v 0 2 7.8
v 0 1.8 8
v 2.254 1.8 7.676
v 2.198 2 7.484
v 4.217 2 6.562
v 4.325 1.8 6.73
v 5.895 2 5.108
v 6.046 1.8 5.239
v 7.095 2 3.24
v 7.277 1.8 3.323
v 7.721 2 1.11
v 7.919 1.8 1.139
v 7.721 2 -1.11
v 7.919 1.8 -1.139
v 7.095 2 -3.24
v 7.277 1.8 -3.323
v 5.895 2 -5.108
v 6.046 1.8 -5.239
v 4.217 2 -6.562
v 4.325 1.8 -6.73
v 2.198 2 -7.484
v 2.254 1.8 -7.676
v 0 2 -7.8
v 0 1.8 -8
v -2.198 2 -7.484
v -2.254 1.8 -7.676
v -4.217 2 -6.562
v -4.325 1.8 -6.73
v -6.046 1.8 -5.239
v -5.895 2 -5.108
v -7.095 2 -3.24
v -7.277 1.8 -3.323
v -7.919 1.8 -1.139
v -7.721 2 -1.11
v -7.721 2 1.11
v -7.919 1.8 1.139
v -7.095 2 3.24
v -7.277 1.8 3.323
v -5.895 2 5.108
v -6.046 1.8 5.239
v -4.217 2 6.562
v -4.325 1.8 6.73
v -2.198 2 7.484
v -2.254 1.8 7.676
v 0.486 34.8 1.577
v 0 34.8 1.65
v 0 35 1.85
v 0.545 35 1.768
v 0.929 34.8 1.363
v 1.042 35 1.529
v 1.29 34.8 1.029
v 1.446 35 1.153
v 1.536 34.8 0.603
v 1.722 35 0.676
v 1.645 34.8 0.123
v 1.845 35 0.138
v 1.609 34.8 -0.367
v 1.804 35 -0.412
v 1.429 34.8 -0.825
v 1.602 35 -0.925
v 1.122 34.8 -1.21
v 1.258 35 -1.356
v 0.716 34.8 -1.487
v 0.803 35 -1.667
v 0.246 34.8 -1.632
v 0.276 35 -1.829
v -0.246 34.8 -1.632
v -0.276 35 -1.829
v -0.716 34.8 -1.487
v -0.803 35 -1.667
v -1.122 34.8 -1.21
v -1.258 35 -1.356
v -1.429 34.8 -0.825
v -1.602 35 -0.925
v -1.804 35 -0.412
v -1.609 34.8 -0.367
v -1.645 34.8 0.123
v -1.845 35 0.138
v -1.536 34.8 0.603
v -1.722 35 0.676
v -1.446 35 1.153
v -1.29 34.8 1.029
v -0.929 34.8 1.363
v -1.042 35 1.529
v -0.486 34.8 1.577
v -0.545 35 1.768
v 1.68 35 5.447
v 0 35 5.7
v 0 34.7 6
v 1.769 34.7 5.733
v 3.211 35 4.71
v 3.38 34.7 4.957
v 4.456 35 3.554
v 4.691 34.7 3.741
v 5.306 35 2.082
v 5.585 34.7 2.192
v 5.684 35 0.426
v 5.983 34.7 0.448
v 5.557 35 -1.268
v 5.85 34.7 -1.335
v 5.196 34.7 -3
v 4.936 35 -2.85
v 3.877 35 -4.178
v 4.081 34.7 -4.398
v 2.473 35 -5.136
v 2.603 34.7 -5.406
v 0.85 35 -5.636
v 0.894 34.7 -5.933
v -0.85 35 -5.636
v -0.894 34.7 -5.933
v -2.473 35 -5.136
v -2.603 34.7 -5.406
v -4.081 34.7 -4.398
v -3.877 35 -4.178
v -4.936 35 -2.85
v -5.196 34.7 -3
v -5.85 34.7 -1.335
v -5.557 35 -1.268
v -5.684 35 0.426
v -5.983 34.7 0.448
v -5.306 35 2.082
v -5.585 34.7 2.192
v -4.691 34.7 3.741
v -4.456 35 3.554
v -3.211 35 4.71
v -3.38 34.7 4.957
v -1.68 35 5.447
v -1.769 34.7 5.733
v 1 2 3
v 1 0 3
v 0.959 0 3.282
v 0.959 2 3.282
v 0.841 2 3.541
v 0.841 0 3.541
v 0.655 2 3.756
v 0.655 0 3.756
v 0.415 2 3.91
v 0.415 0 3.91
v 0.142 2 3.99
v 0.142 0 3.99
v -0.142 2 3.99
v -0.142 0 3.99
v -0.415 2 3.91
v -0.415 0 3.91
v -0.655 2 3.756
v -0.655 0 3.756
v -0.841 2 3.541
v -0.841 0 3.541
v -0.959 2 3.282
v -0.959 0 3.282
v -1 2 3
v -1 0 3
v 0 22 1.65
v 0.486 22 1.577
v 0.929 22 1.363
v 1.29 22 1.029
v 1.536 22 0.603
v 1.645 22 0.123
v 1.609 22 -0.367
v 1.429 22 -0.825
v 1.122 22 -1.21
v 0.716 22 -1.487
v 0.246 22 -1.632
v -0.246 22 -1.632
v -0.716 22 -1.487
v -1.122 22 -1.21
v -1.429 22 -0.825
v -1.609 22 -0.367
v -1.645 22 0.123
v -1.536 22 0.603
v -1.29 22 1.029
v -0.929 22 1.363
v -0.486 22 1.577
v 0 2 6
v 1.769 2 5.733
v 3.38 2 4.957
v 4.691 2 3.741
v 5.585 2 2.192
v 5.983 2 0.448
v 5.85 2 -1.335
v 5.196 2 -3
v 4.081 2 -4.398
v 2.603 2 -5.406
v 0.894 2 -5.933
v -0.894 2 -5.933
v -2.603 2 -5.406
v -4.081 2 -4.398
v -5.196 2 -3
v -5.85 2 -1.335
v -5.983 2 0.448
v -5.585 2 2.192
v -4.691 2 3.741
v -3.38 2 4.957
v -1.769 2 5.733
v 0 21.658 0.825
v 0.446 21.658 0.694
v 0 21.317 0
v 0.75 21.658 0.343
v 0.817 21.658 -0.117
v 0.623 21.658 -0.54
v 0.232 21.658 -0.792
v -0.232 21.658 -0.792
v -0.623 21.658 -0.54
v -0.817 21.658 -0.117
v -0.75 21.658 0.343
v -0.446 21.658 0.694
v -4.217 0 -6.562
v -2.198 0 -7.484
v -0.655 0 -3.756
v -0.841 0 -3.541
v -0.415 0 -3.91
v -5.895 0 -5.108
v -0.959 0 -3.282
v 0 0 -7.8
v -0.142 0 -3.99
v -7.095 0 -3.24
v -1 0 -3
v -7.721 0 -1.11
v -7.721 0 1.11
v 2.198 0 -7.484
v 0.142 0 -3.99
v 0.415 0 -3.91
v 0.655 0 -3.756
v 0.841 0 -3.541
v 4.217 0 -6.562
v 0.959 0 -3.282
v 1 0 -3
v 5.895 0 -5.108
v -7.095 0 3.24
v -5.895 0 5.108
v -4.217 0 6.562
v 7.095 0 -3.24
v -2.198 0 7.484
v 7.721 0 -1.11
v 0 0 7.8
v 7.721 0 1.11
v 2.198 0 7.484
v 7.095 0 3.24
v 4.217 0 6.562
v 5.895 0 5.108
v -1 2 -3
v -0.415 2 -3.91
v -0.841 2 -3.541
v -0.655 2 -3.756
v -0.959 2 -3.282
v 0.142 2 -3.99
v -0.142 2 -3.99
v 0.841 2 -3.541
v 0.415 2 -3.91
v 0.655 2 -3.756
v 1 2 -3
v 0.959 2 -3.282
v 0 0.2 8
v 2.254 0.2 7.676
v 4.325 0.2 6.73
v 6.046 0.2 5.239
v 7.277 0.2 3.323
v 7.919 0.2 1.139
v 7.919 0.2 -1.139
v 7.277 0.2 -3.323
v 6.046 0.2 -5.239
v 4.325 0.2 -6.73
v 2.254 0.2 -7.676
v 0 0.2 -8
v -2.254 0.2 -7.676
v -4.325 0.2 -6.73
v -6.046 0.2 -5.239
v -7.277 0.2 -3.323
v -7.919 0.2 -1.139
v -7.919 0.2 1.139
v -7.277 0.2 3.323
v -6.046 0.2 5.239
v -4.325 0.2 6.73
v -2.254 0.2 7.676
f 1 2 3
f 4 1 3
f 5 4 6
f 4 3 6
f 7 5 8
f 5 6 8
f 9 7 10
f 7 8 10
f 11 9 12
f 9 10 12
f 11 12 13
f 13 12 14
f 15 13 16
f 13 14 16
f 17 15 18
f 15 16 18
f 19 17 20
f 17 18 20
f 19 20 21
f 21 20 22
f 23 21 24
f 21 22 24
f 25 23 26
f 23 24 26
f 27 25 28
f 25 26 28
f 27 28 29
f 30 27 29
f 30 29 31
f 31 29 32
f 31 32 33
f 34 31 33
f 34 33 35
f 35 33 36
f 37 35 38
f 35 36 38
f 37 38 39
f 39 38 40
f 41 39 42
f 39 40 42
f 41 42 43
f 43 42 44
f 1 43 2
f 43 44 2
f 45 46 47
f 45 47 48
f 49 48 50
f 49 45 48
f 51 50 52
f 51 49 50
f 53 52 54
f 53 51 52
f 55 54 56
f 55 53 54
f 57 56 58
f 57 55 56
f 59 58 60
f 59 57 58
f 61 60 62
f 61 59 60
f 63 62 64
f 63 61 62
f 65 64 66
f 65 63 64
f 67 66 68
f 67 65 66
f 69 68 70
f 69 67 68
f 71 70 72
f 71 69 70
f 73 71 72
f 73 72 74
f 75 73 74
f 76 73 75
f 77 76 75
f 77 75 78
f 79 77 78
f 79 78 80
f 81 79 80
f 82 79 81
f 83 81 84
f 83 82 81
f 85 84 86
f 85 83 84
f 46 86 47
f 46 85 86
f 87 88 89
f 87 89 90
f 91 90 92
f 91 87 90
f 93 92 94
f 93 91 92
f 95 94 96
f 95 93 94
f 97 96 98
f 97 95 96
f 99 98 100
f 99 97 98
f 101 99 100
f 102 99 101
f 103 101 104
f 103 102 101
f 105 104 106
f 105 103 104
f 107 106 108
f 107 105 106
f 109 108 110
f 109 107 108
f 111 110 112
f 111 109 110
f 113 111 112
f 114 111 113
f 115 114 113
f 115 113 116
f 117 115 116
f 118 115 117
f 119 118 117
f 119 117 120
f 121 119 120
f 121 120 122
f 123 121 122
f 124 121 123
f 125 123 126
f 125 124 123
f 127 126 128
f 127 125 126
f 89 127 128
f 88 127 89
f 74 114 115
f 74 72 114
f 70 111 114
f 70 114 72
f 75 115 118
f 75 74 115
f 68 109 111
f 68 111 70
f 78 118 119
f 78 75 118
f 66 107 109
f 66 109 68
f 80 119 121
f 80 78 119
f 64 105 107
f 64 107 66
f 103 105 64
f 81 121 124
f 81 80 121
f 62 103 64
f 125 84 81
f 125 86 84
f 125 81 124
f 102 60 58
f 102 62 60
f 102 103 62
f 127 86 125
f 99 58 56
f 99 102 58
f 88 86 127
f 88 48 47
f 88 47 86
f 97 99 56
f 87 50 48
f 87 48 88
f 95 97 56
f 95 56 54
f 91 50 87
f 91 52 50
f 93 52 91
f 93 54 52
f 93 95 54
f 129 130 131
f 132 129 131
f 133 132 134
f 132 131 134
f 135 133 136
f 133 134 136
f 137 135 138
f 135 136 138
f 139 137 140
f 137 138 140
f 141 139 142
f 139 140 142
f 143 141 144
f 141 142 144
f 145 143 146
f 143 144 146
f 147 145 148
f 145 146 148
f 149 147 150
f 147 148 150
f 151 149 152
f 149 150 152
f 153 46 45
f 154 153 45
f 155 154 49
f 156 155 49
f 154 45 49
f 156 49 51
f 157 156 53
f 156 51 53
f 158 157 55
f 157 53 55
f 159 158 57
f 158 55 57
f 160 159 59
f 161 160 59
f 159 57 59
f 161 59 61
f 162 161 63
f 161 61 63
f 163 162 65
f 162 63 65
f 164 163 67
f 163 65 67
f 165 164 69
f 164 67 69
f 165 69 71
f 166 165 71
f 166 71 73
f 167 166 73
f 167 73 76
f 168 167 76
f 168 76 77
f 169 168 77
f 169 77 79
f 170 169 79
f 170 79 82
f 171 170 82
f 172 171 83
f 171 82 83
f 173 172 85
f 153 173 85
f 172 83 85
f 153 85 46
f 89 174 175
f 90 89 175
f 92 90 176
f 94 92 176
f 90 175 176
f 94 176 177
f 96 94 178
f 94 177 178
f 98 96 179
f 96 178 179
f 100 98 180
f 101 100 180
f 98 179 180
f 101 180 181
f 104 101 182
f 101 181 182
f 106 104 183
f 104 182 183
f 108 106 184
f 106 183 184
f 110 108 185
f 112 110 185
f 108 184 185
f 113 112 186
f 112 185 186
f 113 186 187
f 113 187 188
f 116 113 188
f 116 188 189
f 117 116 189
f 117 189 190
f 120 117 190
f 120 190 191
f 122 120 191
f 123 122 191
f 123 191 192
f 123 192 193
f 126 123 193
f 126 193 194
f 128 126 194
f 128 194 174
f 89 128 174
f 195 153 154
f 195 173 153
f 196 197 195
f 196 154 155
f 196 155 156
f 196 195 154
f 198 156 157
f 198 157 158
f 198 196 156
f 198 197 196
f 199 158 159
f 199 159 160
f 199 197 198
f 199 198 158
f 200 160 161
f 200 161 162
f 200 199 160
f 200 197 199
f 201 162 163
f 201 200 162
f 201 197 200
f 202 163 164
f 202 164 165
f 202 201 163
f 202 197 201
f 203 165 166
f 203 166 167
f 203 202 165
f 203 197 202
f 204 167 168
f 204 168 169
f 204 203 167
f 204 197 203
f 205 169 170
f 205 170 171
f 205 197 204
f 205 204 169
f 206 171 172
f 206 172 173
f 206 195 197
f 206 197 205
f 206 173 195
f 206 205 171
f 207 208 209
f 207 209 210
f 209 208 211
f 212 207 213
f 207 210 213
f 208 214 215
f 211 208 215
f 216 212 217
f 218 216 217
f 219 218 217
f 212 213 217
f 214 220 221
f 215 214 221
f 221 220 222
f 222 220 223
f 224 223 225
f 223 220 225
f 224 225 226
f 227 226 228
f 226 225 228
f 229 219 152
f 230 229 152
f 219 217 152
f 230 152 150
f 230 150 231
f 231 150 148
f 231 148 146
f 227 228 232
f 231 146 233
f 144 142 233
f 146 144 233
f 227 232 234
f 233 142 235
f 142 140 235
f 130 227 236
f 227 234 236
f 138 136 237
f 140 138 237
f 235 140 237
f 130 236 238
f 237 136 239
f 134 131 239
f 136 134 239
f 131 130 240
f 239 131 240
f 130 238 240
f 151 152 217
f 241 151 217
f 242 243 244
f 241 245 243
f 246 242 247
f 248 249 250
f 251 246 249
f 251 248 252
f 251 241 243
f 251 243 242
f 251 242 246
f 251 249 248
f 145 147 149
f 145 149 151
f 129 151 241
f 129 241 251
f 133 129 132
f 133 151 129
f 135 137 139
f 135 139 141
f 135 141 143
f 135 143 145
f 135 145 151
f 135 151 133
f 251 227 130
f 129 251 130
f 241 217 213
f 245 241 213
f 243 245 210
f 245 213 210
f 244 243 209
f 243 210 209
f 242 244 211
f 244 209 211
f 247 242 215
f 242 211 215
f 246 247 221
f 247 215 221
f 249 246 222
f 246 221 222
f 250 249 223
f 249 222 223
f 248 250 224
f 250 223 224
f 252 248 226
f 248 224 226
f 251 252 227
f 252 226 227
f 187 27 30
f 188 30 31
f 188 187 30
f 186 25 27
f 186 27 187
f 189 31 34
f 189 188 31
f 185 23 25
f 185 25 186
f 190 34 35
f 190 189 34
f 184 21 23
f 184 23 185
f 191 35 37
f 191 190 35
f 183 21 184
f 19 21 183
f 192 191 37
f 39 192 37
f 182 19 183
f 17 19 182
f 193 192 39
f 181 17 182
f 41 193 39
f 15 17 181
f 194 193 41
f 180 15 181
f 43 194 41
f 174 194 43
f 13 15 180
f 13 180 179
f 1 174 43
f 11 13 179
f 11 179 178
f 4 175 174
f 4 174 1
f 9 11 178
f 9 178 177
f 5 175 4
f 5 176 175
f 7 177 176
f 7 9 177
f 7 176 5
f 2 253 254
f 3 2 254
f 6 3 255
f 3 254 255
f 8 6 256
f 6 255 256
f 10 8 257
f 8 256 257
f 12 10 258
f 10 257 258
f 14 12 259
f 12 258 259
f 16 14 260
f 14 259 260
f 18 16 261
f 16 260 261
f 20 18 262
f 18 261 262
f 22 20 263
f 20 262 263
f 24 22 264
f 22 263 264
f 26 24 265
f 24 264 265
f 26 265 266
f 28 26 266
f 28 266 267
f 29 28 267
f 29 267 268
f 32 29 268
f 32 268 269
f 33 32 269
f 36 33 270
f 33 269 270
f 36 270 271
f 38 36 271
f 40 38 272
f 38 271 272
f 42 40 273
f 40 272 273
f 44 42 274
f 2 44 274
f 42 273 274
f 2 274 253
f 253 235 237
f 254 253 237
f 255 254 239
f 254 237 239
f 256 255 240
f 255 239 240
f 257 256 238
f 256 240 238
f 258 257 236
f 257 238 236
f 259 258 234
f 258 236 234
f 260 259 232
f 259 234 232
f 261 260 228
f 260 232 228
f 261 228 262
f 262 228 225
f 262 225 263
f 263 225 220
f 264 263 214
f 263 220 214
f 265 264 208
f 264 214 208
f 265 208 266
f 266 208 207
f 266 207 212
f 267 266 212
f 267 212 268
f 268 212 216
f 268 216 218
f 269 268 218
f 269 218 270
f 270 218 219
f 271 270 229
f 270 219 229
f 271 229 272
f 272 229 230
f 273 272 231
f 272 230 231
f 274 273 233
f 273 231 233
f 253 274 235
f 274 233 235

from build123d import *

# Parameters (mm, degrees)
SKETCH_1_R          = 8
SKETCH_1_R_2        = 6
EXTRUDE_1_DEPTH     = 2
SKETCH_1_3_R        = 6
SKETCH_1_3_R_2      = 1.65
EXTRUDE_2_DEPTH     = 35
SKETCH_2_R          = 1
CUT_EXTRUDE_1_DEPTH = 2
CUT_EXTRUDE_START   = 35
SKETCH_1_4_R        = 1.65
CUT_EXTRUDE_2_DEPTH = 13
CHAMFER_1_SIZE      = 0.2
CHAMFER_2_SIZE      = 0.3


with BuildPart() as part:
    # 스케치1 → 보스-돌출1 (new body)
    with BuildSketch(Plane(origin=(0, 0, 0), x_dir=(1, 0, 0), z_dir=(0, 1, 0))):
        with Locations(Location((0, 0, 0), (0, 0, 270))):
            Circle(SKETCH_1_R)
        with Locations(Location((0, 0, 0), (0, 0, 270))):
            Circle(SKETCH_1_R_2, mode=Mode.SUBTRACT)
    extrude(amount=EXTRUDE_1_DEPTH)

    # 스케치1<3> → 보스-돌출2 (add)
    # profile 1 of 2: a face of its own
    with BuildSketch(Plane(origin=(0, 0, 0), x_dir=(1, 0, 0), z_dir=(0, 1, 0))):
        with Locations(Location((0, 0, 0), (0, 0, 270))):
            Circle(SKETCH_1_3_R)
        Circle(SKETCH_1_3_R_2, mode=Mode.SUBTRACT)
    # profile 2 of 2: a face of its own
    with BuildSketch(Plane(origin=(0, 0, 0), x_dir=(1, 0, 0), z_dir=(0, 1, 0))):
        Circle(SKETCH_1_3_R_2)
    extrude(amount=EXTRUDE_2_DEPTH)

    # 스케치2 → 컷-돌출1 (cut)
    with BuildSketch(Plane.XZ):
        with Locations((0, 3)):
            Circle(SKETCH_2_R)
        with BuildLine():
            ThreePointArc((1, 3), (0, 2), (-1, 3))
            Line((-1, 3), (-1, -3))
            ThreePointArc((-1, -3), (0, -2), (1, -3))
            Line((1, -3), (1, 3))
        make_face()
        with Locations((0, -3)):
            Circle(SKETCH_2_R)
    extrude(amount=-CUT_EXTRUDE_1_DEPTH, mode=Mode.SUBTRACT)

    # 스케치1<4> → 컷-돌출2 (cut)
    with BuildSketch(Plane(origin=(0, 0, 0), x_dir=(1, 0, 0), z_dir=(0, 1, 0)).offset(CUT_EXTRUDE_START)):
        with Locations(Location((0, 0, 0), (0, 0, 270))):
            Circle(SKETCH_1_4_R)
    extrude(amount=-CUT_EXTRUDE_2_DEPTH, mode=Mode.SUBTRACT)

    # 모따기1
    chamfer_1_edges = [part.edges().sort_by_distance(p)[0] for p in [
        (0, 2, -8),
        (0, 35, -1.65),
        (0, 0, -8),
    ]]
    chamfer(chamfer_1_edges, length=CHAMFER_1_SIZE)

    # 모따기2
    chamfer_2_edges = [part.edges().sort_by_distance(p)[0] for p in [
        (0, 35, -6),
    ]]
    chamfer(chamfer_2_edges, length=CHAMFER_2_SIZE)

    # 스케치3 → 컷-회전1 (revolve, cut)
    with BuildSketch(Plane.XY, mode=Mode.PRIVATE) as cut_revolve_1_sk:
        Polygon((-1.65, 22), (0, 21.316547622), (0, 22), align=None)
    revolve(cut_revolve_1_sk.sketch.rotate(Axis((0, -0.686408766, 0), (0, 1, 0)), 90), axis=Axis((0, -0.686408766, 0), (0, 1, 0)), mode=Mode.SUBTRACT)


solid = part.part
